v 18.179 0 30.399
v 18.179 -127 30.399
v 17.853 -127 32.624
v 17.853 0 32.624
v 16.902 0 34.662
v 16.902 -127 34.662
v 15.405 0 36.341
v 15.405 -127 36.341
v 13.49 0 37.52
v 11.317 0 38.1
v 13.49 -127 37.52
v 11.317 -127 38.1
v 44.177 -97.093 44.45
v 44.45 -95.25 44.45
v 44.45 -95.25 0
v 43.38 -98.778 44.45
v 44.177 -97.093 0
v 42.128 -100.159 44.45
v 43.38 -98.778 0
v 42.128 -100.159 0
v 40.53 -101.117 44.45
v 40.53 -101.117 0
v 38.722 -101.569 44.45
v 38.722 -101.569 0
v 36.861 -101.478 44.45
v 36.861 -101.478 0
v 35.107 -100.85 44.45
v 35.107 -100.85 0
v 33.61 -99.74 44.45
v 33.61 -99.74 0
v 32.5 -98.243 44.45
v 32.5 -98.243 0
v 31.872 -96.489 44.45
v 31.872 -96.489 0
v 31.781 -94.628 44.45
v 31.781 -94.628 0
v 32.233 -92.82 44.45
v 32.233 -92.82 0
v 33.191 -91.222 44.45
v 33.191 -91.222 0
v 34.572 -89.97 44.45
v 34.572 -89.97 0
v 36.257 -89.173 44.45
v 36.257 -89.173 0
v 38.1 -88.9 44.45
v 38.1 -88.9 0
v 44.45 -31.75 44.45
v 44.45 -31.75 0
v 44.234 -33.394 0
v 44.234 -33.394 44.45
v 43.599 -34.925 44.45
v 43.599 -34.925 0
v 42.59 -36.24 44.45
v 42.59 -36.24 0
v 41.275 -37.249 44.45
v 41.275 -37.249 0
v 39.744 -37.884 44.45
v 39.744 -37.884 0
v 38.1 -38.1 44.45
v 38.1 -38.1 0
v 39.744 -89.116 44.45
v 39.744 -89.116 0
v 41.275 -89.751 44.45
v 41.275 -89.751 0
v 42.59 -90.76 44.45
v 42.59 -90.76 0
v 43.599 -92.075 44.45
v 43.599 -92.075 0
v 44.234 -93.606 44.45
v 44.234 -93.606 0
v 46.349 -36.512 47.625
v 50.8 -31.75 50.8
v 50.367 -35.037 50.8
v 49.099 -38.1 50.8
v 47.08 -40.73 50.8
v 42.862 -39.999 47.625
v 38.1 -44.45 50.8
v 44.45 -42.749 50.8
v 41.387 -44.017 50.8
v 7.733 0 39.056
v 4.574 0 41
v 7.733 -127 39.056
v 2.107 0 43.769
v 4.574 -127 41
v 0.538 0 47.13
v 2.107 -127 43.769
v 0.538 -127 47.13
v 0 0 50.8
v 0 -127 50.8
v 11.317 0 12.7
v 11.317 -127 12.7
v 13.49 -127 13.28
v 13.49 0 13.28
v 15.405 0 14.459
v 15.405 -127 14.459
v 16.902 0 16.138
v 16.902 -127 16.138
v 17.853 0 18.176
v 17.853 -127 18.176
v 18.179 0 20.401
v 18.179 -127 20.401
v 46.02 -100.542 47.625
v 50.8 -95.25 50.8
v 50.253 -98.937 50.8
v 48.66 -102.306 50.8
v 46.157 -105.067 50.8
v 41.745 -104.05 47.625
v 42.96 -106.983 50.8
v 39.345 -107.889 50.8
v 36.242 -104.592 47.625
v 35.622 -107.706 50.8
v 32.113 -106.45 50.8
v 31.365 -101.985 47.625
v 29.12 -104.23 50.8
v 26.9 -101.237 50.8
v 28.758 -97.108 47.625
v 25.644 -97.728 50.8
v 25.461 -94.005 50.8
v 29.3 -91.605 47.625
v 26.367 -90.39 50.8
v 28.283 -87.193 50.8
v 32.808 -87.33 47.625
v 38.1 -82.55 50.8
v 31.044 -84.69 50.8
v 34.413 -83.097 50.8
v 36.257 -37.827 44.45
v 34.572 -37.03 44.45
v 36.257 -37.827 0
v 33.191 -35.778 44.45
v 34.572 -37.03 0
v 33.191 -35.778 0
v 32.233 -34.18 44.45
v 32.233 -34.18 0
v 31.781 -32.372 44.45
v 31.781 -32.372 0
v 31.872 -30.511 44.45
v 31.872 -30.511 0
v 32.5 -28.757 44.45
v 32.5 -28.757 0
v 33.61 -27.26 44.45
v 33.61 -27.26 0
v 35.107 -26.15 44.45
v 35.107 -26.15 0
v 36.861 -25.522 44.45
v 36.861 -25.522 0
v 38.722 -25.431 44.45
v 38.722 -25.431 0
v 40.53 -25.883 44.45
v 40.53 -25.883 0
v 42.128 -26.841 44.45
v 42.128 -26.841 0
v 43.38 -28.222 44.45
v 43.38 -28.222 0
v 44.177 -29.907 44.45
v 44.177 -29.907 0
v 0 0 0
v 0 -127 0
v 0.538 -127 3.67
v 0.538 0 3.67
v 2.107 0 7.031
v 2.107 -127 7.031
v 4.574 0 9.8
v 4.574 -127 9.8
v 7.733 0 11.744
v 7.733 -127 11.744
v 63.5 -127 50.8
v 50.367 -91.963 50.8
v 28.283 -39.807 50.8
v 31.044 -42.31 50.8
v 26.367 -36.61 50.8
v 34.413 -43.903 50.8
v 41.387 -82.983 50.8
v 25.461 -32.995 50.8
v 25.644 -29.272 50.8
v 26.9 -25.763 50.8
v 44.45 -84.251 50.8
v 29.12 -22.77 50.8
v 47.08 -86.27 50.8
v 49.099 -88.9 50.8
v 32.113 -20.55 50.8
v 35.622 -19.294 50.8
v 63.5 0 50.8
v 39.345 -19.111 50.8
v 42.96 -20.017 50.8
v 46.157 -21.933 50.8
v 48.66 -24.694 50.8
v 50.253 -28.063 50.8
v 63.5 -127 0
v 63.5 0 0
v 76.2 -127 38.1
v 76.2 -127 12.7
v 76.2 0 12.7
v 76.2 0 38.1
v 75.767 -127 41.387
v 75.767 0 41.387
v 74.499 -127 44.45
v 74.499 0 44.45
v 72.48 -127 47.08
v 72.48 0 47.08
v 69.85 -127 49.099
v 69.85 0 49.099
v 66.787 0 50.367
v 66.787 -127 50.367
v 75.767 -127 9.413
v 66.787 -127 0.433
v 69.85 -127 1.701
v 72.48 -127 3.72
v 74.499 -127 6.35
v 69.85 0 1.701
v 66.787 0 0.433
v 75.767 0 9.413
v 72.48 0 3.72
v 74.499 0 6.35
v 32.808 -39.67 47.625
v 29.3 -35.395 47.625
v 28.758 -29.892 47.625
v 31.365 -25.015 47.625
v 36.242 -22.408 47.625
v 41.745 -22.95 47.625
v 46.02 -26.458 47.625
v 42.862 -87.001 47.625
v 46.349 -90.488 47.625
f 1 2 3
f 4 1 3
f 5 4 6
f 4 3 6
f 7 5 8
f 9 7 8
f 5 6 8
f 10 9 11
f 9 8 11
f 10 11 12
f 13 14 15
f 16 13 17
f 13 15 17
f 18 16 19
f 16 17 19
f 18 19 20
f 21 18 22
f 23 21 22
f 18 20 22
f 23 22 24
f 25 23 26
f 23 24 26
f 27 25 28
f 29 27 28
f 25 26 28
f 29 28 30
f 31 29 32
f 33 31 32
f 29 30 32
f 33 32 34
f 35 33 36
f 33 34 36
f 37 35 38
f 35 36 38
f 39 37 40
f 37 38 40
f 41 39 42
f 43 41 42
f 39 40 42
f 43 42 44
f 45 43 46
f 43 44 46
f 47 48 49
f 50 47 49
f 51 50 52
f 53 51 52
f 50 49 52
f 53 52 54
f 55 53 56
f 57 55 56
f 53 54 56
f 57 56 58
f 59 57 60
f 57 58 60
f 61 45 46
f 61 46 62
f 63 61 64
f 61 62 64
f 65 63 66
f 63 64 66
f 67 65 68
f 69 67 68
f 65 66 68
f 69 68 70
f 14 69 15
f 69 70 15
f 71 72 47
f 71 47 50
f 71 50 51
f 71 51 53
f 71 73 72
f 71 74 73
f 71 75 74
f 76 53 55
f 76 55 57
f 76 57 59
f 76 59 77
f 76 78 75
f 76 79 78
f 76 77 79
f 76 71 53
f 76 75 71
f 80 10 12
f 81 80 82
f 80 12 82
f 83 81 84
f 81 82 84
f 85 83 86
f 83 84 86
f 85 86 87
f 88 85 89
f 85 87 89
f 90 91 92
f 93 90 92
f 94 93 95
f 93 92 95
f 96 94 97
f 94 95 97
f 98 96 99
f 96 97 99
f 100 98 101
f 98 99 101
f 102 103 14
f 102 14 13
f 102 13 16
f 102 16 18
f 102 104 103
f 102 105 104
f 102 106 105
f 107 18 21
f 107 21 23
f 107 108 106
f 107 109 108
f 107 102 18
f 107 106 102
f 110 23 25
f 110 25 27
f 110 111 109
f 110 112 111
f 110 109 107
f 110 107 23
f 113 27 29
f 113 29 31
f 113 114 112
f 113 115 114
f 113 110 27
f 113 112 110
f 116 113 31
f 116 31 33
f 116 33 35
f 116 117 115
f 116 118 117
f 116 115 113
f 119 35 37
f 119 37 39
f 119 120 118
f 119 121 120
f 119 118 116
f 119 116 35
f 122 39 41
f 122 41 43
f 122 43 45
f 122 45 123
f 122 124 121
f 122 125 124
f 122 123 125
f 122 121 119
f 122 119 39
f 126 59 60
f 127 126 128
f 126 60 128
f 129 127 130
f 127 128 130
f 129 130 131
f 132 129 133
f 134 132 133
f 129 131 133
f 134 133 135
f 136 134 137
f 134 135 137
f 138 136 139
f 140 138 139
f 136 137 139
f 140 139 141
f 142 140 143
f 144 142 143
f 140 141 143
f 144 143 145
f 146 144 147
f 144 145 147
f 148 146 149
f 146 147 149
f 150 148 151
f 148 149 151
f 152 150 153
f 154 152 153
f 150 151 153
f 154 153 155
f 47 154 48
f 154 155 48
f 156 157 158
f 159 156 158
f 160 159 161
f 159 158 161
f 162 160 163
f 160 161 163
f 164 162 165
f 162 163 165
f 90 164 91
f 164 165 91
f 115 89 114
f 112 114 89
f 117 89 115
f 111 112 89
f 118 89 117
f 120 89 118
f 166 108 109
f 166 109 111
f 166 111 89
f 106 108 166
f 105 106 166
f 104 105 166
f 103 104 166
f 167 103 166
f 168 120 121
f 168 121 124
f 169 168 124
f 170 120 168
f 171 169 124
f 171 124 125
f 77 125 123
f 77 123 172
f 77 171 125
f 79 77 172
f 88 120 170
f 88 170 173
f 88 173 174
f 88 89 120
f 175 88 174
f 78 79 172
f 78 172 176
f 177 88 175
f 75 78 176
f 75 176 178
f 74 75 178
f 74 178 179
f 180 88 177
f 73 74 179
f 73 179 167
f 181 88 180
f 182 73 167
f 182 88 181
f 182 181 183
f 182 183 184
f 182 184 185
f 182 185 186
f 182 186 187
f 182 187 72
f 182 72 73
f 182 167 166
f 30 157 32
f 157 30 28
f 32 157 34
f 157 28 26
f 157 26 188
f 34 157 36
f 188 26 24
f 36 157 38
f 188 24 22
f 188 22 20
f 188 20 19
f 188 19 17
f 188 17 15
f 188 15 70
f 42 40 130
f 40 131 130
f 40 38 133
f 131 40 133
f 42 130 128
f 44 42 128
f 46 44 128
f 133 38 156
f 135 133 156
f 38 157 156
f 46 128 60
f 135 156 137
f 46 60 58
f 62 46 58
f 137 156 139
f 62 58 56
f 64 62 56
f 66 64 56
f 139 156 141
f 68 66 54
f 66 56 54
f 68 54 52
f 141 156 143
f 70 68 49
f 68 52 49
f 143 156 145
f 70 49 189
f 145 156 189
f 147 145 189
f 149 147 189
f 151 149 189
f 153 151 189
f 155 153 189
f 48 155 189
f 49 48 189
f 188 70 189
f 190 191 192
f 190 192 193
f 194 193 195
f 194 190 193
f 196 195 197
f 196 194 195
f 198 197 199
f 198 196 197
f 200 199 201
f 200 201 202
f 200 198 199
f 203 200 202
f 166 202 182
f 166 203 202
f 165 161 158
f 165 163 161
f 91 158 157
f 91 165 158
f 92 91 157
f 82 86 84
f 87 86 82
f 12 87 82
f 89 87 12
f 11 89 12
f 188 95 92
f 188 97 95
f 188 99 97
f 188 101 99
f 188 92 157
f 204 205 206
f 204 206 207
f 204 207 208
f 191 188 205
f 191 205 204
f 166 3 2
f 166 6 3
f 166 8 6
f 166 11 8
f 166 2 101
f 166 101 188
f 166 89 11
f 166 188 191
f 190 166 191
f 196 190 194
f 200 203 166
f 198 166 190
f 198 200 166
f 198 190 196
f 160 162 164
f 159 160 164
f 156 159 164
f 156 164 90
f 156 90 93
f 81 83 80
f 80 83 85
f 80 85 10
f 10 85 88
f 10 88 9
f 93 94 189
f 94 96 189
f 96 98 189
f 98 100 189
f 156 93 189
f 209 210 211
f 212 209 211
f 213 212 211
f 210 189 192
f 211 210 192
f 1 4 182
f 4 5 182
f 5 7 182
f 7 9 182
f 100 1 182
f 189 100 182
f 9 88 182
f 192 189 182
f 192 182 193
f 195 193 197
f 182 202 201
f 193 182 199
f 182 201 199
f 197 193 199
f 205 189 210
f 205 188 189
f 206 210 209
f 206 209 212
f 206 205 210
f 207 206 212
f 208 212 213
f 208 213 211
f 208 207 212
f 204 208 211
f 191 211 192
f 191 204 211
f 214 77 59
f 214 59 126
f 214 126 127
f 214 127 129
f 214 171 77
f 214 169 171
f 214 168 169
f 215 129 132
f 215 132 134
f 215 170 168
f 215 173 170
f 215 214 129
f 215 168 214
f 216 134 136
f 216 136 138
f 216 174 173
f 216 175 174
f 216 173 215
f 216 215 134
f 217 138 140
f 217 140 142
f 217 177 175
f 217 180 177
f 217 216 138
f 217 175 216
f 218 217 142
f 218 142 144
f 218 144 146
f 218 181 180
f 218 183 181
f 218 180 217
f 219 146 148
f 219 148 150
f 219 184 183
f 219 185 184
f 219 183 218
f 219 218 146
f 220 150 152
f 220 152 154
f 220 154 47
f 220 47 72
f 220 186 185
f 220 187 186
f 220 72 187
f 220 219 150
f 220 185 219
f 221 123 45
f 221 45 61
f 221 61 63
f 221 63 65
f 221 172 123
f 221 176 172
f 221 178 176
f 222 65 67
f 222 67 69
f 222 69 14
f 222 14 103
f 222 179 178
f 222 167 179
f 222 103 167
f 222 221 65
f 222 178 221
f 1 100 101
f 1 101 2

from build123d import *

# Parameters (mm, degrees)
F0_W     = 76.2
F0_H     = 50.8
F1_DEPTH = 127
F3_DEPTH = 127.001
F4_R     = 12.7
F6_DEPTH = 50.801
F7_SIZE  = 6.35


with BuildPart() as f1:
    # F0 (on Front) → F1 (new body)
    with BuildSketch(Plane.XZ):
        with Locations((38.1, 25.4)):
            Rectangle(F0_W, F0_H)
    extrude(amount=F1_DEPTH)

    # F2 (on face) → F3 (cut, through all)
    with BuildSketch(Plane.XZ.offset(127)):
        with BuildLine():
            ThreePointArc((11.316762, 38.1), (3.239664, 42.294721), (0, 50.8))
            Line((0, 50.8), (0, 0))
            ThreePointArc((0, 0), (3.239664, 8.505279), (11.316762, 12.7))
            ThreePointArc((11.316762, 12.7), (16.214601, 15.24362), (18.179088, 20.401103))
            Line((18.179088, 20.401103), (18.179088, 30.398897))
            ThreePointArc((18.179088, 30.398897), (16.214601, 35.55638), (11.316762, 38.1))
        make_face()
    extrude(amount=-F3_DEPTH, mode=Mode.SUBTRACT)

    # F4
    f4_edges = [f1.edges().sort_by_distance(p)[0] for p in [
        (76.2, -63.5, 50.8),
        (76.2, -63.5, 0),
    ]]
    fillet(f4_edges, radius=F4_R)

    # F5 (on face) → F6 (cut, through all)
    with BuildSketch(Plane(origin=(0, 0, 0), x_dir=(1, 0, 0), z_dir=(0, 0, -1))):
        with BuildLine():
            ThreePointArc((38.1, 88.9), (42.590128, 90.759872), (44.45, 95.25))
            ThreePointArc((44.45, 95.25), (33.609872, 99.740128), (38.1, 88.9))
        make_face()
        with BuildLine():
            ThreePointArc((44.45, 31.75), (42.590128, 36.240128), (38.1, 38.1))
            ThreePointArc((38.1, 38.1), (33.609872, 27.259872), (44.45, 31.75))
        make_face()
    extrude(amount=-F6_DEPTH, mode=Mode.SUBTRACT)

    # F7
    f7_edges = [f1.edges().sort_by_distance(p)[0] for p in [
        (38.1, -101.6, 50.8),
        (31.75, -31.75, 50.8),
    ]]
    chamfer(f7_edges, length=F7_SIZE)


solid = f1.part
